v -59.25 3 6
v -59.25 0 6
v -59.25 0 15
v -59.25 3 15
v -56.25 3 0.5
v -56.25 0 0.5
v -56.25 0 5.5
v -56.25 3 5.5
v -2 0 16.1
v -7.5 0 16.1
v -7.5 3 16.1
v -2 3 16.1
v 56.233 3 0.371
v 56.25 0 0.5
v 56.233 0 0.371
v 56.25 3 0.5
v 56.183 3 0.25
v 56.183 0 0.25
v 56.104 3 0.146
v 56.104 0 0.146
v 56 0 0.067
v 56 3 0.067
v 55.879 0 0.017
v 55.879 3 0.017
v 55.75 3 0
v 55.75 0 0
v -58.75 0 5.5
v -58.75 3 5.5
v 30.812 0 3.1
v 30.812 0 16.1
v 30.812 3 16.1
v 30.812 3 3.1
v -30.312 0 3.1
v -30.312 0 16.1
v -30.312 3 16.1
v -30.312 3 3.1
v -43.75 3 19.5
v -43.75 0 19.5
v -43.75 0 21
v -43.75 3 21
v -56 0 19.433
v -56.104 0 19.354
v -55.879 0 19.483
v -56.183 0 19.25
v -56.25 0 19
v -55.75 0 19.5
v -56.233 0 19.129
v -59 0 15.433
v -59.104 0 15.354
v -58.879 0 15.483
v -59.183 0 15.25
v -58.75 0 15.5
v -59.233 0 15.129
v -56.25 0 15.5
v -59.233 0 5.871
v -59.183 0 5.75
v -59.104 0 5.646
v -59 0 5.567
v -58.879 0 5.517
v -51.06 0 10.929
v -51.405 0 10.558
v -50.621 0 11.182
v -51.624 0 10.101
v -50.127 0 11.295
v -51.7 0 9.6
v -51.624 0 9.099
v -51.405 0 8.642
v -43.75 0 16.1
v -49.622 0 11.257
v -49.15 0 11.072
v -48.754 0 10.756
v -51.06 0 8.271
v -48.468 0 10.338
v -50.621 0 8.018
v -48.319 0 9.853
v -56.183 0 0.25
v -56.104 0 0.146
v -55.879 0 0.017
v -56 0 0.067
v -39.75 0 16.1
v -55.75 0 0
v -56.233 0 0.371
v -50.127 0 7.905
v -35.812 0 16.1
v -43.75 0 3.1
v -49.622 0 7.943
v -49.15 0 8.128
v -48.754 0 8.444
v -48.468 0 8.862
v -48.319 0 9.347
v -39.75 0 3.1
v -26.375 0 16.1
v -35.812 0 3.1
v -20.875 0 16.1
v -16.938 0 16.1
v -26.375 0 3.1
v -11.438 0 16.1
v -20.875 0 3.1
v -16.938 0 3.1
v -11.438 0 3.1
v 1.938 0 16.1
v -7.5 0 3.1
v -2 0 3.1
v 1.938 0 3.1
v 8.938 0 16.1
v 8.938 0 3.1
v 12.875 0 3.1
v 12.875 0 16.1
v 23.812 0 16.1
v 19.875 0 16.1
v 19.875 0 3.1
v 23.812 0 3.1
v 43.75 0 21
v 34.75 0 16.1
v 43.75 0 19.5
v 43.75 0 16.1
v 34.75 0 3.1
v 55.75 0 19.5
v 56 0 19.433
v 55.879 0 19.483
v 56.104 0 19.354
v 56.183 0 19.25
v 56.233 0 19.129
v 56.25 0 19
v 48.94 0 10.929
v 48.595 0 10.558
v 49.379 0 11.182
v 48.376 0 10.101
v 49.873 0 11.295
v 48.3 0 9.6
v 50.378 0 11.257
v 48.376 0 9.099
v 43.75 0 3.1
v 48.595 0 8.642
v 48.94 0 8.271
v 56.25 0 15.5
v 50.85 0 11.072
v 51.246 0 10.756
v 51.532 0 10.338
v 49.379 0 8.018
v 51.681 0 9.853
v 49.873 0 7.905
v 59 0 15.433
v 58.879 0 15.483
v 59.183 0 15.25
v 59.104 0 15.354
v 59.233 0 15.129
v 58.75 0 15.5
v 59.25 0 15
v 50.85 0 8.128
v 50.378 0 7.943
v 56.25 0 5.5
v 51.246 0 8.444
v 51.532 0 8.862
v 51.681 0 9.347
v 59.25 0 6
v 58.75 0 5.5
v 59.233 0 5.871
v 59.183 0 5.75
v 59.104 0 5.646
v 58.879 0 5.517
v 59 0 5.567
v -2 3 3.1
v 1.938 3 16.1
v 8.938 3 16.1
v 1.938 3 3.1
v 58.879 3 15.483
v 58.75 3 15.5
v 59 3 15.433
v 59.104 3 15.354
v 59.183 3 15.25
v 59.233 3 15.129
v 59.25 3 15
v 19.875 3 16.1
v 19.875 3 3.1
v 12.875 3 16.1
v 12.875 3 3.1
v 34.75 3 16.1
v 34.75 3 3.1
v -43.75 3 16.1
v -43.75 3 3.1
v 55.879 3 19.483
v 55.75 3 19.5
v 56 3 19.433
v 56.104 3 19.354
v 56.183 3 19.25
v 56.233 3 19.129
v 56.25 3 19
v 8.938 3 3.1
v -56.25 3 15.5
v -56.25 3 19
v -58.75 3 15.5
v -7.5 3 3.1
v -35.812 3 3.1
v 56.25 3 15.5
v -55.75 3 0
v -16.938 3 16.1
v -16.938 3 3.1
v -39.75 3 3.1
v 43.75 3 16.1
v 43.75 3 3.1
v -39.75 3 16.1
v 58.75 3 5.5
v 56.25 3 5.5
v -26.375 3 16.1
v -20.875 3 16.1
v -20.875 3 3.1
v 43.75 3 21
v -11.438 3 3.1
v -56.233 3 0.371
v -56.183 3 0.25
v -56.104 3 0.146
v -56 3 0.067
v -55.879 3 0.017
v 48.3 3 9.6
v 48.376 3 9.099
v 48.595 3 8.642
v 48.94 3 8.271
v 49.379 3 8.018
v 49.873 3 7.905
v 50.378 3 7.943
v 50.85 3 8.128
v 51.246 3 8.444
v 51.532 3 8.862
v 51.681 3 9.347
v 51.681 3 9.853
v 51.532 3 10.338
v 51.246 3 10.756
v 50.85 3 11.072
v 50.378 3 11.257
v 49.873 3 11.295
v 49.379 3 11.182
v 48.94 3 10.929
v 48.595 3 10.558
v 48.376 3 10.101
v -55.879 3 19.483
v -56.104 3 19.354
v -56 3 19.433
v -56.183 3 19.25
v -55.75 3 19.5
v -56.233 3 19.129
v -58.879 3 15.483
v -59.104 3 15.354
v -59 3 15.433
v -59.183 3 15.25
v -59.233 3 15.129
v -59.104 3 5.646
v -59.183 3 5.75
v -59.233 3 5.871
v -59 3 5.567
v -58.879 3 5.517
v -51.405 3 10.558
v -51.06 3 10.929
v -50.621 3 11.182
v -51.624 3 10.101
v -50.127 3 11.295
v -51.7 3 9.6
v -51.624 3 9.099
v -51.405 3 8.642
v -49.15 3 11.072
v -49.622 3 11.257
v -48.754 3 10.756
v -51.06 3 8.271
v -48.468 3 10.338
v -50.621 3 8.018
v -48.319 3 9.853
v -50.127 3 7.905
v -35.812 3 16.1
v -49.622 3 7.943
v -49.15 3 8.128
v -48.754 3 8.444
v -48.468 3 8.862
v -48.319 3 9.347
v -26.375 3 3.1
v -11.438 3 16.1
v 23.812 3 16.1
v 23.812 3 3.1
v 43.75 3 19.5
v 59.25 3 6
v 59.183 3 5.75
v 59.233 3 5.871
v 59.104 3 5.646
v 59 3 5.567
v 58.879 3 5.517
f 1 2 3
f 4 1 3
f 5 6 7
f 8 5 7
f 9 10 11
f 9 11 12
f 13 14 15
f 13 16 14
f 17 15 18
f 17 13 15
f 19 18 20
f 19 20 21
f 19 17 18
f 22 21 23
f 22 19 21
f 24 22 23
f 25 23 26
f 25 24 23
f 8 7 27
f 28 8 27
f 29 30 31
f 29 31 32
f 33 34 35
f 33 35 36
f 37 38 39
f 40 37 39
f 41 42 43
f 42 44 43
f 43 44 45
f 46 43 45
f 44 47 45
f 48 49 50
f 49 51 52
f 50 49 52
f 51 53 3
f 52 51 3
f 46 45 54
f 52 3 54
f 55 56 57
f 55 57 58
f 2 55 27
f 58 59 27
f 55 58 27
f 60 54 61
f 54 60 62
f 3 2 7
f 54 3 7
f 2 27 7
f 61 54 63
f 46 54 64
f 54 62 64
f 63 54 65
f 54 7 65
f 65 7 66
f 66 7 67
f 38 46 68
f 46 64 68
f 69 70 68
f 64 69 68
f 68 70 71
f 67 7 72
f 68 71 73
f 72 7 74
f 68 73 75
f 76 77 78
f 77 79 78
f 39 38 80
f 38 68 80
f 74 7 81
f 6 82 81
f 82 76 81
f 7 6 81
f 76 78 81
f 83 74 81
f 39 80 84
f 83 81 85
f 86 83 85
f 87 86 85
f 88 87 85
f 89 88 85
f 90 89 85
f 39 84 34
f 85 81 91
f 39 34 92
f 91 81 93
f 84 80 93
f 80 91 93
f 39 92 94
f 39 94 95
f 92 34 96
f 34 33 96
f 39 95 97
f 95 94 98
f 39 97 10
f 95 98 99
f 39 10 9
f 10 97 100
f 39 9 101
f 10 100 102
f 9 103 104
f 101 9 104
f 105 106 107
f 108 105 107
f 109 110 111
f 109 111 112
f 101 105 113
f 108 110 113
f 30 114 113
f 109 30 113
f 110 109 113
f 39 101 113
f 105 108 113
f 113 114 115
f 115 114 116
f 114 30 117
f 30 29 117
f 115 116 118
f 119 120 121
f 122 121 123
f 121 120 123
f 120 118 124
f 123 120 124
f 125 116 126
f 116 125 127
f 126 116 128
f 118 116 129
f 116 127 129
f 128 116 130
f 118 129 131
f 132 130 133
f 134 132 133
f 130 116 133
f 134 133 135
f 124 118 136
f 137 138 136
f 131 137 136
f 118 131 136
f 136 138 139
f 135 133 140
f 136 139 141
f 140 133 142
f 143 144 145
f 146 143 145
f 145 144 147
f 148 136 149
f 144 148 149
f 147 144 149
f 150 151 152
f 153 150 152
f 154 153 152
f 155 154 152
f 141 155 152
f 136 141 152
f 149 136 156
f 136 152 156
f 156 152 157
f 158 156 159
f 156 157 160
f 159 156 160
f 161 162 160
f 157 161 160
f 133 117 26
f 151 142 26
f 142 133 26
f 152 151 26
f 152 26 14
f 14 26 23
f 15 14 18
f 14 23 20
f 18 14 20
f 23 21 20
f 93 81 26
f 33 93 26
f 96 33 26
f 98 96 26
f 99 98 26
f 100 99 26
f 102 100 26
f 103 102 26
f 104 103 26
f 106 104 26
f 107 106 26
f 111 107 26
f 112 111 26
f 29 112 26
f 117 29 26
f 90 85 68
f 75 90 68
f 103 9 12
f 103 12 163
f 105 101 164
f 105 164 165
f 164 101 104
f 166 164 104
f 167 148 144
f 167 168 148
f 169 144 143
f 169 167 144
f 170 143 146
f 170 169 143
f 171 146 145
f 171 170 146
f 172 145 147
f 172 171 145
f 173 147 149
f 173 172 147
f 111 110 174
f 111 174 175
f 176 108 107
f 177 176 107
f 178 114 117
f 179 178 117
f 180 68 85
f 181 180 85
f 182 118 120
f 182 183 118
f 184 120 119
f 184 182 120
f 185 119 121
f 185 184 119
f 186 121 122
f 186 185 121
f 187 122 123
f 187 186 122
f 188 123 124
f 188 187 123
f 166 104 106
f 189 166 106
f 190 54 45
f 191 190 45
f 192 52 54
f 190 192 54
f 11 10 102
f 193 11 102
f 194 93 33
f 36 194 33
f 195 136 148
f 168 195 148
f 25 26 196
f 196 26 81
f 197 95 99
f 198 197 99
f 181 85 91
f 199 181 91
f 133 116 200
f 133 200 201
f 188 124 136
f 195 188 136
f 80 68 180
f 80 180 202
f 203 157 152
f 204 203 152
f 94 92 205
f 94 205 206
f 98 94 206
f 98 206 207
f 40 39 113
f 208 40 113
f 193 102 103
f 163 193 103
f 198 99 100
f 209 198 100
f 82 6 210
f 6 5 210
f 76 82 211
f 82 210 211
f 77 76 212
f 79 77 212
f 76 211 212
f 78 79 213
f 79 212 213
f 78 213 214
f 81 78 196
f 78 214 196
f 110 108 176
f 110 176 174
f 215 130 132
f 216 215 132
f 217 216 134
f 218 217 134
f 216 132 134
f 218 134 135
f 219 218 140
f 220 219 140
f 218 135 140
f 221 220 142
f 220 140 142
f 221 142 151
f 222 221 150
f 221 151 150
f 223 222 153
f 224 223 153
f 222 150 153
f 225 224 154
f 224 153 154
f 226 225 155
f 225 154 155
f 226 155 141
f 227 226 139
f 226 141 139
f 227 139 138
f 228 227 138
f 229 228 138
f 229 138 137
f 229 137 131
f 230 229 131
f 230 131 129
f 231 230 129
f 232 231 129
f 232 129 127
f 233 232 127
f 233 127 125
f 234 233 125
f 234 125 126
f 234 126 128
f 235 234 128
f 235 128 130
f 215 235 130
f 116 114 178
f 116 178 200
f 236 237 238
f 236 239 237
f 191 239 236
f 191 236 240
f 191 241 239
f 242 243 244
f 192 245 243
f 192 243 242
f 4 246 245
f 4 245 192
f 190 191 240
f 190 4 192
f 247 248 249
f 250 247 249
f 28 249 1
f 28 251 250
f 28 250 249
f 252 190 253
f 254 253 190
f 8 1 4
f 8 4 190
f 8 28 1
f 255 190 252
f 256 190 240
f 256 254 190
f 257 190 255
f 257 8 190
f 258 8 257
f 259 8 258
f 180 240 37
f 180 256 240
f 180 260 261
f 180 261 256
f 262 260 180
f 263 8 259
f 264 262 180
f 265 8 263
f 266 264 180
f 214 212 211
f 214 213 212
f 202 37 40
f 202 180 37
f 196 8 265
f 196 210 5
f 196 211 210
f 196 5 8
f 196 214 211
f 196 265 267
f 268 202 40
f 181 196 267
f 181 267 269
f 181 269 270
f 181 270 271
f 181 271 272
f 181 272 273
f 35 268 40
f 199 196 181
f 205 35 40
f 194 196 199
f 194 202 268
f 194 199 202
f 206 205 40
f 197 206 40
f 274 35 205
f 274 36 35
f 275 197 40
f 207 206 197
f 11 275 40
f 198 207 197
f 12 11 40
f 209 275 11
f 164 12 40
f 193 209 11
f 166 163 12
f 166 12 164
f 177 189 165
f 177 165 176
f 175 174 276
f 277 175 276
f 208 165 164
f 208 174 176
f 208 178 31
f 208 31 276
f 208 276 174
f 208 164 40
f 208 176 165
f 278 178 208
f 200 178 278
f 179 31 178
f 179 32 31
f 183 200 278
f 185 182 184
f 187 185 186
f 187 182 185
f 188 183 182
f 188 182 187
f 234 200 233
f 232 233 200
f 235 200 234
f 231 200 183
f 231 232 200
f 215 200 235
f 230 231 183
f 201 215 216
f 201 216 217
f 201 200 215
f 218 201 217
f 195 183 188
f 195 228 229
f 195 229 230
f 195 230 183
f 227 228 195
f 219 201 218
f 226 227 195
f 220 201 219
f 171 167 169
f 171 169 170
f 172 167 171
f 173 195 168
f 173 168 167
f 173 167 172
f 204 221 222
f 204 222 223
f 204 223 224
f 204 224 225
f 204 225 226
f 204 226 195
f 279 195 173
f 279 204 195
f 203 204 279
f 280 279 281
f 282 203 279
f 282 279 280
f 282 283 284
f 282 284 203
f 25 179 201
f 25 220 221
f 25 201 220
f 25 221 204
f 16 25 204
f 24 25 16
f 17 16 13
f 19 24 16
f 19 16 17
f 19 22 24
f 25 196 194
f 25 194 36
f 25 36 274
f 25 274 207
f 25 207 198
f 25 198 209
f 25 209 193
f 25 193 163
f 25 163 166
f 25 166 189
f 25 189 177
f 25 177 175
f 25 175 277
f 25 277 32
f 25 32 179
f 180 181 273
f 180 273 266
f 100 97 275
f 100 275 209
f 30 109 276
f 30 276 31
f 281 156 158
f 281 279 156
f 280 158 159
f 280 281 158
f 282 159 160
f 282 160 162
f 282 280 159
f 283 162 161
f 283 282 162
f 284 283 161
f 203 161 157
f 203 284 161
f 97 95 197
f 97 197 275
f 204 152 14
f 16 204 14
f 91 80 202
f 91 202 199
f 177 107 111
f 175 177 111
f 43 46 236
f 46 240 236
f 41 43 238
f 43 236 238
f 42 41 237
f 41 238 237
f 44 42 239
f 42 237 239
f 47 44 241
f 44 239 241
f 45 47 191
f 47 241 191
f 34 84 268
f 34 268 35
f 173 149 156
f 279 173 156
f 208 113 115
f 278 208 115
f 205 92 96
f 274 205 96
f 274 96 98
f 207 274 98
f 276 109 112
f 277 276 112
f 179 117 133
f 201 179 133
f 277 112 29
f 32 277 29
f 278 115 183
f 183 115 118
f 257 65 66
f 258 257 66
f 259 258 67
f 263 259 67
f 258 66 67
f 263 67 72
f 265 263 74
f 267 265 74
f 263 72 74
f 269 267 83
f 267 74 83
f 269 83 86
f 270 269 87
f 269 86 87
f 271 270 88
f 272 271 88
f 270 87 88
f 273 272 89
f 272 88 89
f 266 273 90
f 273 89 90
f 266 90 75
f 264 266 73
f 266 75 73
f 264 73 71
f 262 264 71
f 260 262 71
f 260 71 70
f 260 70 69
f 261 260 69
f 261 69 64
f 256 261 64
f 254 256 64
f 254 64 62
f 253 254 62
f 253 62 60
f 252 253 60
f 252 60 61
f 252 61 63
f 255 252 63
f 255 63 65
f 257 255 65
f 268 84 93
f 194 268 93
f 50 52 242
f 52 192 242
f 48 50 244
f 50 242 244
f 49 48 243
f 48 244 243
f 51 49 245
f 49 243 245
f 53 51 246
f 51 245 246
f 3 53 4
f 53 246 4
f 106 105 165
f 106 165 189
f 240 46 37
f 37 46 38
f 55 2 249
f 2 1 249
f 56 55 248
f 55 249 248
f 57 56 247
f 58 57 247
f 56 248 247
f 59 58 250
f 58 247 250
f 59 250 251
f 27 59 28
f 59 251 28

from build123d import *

# Parameters (mm, degrees)
SKETCH_1_W            = 5.5
SKETCH_1_H            = 13
SKETCH_1_W_2          = 7
SKETCH_1_W_3          = 4
SKETCH_1_W_4          = 9
EXTRUDE_1_DEPTH       = 3
HOLE_WIZARD_M31_D     = 3.4
HOLE_WIZARD_M31_DEPTH = 10
HOLE_WIZARD_M31_TIP   = 1.021463052
FILLET_1_R            = 0.5


with BuildPart() as part:
    # Эскиз1 → Бобышка-Вытянуть1 (new body)
    with BuildSketch(Plane(origin=(0, 0, 0), x_dir=(1, 0, 0), z_dir=(0, 1, 0))):
        Polygon((-43.75, -21), (43.75, -21), (43.75, -19.5), (56.25, -19.5), (56.25, -15.5), (59.25, -15.5), (59.25, -5.5), (56.25, -5.5), (56.25, 0), (-56.25, 0), (-56.25, -5.5), (-59.25, -5.5), (-59.25, -15.5), (-56.25, -15.5), (-56.25, -19.5), (-43.75, -19.5), align=None)
        with Locations((-23.625, -9.6)):
            Rectangle(SKETCH_1_W, SKETCH_1_H, mode=Mode.SUBTRACT)
        with Locations((-33.0625, -9.6)):
            Rectangle(SKETCH_1_W, SKETCH_1_H, mode=Mode.SUBTRACT)
        with Locations((-14.1875, -9.6)):
            Rectangle(SKETCH_1_W, SKETCH_1_H, mode=Mode.SUBTRACT)
        with Locations((-4.75, -9.6)):
            Rectangle(SKETCH_1_W, SKETCH_1_H, mode=Mode.SUBTRACT)
        with Locations((16.375, -9.6)):
            Rectangle(SKETCH_1_W_2, SKETCH_1_H, mode=Mode.SUBTRACT)
        with Locations((5.4375, -9.6)):
            Rectangle(SKETCH_1_W_2, SKETCH_1_H, mode=Mode.SUBTRACT)
        with Locations((27.3125, -9.6)):
            Rectangle(SKETCH_1_W_2, SKETCH_1_H, mode=Mode.SUBTRACT)
        with Locations((-41.75, -9.6)):
            Rectangle(SKETCH_1_W_3, SKETCH_1_H, mode=Mode.SUBTRACT)
        with Locations((39.25, -9.6)):
            Rectangle(SKETCH_1_W_4, SKETCH_1_H, mode=Mode.SUBTRACT)
    extrude(amount=EXTRUDE_1_DEPTH)

    # Отверстие с зазором M31
    with Locations(Plane(origin=(0, 3, 0), x_dir=(1, 0, 0), z_dir=(0, 1, 0))):
        with Locations((50, -9.6), (-50, -9.6)):
            Hole(HOLE_WIZARD_M31_D / 2, depth=HOLE_WIZARD_M31_DEPTH)
            with Locations((0, 0, -(HOLE_WIZARD_M31_DEPTH + HOLE_WIZARD_M31_TIP / 2))):  # 118° drill point
                Cone(0, HOLE_WIZARD_M31_D / 2, HOLE_WIZARD_M31_TIP, mode=Mode.SUBTRACT)

    # Скругление1
    fillet_1_edges = [part.edges().sort_by_distance(p)[0] for p in [
        (-56.25, 1.5, 19.5),
        (-59.25, 1.5, 15.5),
        (-59.25, 1.5, 5.5),
        (-56.25, 1.5, 0),
        (56.25, 1.5, 0),
        (59.25, 1.5, 5.5),
        (59.25, 1.5, 15.5),
        (56.25, 1.5, 19.5),
    ]]
    fillet(fillet_1_edges, radius=FILLET_1_R)


solid = part.part
